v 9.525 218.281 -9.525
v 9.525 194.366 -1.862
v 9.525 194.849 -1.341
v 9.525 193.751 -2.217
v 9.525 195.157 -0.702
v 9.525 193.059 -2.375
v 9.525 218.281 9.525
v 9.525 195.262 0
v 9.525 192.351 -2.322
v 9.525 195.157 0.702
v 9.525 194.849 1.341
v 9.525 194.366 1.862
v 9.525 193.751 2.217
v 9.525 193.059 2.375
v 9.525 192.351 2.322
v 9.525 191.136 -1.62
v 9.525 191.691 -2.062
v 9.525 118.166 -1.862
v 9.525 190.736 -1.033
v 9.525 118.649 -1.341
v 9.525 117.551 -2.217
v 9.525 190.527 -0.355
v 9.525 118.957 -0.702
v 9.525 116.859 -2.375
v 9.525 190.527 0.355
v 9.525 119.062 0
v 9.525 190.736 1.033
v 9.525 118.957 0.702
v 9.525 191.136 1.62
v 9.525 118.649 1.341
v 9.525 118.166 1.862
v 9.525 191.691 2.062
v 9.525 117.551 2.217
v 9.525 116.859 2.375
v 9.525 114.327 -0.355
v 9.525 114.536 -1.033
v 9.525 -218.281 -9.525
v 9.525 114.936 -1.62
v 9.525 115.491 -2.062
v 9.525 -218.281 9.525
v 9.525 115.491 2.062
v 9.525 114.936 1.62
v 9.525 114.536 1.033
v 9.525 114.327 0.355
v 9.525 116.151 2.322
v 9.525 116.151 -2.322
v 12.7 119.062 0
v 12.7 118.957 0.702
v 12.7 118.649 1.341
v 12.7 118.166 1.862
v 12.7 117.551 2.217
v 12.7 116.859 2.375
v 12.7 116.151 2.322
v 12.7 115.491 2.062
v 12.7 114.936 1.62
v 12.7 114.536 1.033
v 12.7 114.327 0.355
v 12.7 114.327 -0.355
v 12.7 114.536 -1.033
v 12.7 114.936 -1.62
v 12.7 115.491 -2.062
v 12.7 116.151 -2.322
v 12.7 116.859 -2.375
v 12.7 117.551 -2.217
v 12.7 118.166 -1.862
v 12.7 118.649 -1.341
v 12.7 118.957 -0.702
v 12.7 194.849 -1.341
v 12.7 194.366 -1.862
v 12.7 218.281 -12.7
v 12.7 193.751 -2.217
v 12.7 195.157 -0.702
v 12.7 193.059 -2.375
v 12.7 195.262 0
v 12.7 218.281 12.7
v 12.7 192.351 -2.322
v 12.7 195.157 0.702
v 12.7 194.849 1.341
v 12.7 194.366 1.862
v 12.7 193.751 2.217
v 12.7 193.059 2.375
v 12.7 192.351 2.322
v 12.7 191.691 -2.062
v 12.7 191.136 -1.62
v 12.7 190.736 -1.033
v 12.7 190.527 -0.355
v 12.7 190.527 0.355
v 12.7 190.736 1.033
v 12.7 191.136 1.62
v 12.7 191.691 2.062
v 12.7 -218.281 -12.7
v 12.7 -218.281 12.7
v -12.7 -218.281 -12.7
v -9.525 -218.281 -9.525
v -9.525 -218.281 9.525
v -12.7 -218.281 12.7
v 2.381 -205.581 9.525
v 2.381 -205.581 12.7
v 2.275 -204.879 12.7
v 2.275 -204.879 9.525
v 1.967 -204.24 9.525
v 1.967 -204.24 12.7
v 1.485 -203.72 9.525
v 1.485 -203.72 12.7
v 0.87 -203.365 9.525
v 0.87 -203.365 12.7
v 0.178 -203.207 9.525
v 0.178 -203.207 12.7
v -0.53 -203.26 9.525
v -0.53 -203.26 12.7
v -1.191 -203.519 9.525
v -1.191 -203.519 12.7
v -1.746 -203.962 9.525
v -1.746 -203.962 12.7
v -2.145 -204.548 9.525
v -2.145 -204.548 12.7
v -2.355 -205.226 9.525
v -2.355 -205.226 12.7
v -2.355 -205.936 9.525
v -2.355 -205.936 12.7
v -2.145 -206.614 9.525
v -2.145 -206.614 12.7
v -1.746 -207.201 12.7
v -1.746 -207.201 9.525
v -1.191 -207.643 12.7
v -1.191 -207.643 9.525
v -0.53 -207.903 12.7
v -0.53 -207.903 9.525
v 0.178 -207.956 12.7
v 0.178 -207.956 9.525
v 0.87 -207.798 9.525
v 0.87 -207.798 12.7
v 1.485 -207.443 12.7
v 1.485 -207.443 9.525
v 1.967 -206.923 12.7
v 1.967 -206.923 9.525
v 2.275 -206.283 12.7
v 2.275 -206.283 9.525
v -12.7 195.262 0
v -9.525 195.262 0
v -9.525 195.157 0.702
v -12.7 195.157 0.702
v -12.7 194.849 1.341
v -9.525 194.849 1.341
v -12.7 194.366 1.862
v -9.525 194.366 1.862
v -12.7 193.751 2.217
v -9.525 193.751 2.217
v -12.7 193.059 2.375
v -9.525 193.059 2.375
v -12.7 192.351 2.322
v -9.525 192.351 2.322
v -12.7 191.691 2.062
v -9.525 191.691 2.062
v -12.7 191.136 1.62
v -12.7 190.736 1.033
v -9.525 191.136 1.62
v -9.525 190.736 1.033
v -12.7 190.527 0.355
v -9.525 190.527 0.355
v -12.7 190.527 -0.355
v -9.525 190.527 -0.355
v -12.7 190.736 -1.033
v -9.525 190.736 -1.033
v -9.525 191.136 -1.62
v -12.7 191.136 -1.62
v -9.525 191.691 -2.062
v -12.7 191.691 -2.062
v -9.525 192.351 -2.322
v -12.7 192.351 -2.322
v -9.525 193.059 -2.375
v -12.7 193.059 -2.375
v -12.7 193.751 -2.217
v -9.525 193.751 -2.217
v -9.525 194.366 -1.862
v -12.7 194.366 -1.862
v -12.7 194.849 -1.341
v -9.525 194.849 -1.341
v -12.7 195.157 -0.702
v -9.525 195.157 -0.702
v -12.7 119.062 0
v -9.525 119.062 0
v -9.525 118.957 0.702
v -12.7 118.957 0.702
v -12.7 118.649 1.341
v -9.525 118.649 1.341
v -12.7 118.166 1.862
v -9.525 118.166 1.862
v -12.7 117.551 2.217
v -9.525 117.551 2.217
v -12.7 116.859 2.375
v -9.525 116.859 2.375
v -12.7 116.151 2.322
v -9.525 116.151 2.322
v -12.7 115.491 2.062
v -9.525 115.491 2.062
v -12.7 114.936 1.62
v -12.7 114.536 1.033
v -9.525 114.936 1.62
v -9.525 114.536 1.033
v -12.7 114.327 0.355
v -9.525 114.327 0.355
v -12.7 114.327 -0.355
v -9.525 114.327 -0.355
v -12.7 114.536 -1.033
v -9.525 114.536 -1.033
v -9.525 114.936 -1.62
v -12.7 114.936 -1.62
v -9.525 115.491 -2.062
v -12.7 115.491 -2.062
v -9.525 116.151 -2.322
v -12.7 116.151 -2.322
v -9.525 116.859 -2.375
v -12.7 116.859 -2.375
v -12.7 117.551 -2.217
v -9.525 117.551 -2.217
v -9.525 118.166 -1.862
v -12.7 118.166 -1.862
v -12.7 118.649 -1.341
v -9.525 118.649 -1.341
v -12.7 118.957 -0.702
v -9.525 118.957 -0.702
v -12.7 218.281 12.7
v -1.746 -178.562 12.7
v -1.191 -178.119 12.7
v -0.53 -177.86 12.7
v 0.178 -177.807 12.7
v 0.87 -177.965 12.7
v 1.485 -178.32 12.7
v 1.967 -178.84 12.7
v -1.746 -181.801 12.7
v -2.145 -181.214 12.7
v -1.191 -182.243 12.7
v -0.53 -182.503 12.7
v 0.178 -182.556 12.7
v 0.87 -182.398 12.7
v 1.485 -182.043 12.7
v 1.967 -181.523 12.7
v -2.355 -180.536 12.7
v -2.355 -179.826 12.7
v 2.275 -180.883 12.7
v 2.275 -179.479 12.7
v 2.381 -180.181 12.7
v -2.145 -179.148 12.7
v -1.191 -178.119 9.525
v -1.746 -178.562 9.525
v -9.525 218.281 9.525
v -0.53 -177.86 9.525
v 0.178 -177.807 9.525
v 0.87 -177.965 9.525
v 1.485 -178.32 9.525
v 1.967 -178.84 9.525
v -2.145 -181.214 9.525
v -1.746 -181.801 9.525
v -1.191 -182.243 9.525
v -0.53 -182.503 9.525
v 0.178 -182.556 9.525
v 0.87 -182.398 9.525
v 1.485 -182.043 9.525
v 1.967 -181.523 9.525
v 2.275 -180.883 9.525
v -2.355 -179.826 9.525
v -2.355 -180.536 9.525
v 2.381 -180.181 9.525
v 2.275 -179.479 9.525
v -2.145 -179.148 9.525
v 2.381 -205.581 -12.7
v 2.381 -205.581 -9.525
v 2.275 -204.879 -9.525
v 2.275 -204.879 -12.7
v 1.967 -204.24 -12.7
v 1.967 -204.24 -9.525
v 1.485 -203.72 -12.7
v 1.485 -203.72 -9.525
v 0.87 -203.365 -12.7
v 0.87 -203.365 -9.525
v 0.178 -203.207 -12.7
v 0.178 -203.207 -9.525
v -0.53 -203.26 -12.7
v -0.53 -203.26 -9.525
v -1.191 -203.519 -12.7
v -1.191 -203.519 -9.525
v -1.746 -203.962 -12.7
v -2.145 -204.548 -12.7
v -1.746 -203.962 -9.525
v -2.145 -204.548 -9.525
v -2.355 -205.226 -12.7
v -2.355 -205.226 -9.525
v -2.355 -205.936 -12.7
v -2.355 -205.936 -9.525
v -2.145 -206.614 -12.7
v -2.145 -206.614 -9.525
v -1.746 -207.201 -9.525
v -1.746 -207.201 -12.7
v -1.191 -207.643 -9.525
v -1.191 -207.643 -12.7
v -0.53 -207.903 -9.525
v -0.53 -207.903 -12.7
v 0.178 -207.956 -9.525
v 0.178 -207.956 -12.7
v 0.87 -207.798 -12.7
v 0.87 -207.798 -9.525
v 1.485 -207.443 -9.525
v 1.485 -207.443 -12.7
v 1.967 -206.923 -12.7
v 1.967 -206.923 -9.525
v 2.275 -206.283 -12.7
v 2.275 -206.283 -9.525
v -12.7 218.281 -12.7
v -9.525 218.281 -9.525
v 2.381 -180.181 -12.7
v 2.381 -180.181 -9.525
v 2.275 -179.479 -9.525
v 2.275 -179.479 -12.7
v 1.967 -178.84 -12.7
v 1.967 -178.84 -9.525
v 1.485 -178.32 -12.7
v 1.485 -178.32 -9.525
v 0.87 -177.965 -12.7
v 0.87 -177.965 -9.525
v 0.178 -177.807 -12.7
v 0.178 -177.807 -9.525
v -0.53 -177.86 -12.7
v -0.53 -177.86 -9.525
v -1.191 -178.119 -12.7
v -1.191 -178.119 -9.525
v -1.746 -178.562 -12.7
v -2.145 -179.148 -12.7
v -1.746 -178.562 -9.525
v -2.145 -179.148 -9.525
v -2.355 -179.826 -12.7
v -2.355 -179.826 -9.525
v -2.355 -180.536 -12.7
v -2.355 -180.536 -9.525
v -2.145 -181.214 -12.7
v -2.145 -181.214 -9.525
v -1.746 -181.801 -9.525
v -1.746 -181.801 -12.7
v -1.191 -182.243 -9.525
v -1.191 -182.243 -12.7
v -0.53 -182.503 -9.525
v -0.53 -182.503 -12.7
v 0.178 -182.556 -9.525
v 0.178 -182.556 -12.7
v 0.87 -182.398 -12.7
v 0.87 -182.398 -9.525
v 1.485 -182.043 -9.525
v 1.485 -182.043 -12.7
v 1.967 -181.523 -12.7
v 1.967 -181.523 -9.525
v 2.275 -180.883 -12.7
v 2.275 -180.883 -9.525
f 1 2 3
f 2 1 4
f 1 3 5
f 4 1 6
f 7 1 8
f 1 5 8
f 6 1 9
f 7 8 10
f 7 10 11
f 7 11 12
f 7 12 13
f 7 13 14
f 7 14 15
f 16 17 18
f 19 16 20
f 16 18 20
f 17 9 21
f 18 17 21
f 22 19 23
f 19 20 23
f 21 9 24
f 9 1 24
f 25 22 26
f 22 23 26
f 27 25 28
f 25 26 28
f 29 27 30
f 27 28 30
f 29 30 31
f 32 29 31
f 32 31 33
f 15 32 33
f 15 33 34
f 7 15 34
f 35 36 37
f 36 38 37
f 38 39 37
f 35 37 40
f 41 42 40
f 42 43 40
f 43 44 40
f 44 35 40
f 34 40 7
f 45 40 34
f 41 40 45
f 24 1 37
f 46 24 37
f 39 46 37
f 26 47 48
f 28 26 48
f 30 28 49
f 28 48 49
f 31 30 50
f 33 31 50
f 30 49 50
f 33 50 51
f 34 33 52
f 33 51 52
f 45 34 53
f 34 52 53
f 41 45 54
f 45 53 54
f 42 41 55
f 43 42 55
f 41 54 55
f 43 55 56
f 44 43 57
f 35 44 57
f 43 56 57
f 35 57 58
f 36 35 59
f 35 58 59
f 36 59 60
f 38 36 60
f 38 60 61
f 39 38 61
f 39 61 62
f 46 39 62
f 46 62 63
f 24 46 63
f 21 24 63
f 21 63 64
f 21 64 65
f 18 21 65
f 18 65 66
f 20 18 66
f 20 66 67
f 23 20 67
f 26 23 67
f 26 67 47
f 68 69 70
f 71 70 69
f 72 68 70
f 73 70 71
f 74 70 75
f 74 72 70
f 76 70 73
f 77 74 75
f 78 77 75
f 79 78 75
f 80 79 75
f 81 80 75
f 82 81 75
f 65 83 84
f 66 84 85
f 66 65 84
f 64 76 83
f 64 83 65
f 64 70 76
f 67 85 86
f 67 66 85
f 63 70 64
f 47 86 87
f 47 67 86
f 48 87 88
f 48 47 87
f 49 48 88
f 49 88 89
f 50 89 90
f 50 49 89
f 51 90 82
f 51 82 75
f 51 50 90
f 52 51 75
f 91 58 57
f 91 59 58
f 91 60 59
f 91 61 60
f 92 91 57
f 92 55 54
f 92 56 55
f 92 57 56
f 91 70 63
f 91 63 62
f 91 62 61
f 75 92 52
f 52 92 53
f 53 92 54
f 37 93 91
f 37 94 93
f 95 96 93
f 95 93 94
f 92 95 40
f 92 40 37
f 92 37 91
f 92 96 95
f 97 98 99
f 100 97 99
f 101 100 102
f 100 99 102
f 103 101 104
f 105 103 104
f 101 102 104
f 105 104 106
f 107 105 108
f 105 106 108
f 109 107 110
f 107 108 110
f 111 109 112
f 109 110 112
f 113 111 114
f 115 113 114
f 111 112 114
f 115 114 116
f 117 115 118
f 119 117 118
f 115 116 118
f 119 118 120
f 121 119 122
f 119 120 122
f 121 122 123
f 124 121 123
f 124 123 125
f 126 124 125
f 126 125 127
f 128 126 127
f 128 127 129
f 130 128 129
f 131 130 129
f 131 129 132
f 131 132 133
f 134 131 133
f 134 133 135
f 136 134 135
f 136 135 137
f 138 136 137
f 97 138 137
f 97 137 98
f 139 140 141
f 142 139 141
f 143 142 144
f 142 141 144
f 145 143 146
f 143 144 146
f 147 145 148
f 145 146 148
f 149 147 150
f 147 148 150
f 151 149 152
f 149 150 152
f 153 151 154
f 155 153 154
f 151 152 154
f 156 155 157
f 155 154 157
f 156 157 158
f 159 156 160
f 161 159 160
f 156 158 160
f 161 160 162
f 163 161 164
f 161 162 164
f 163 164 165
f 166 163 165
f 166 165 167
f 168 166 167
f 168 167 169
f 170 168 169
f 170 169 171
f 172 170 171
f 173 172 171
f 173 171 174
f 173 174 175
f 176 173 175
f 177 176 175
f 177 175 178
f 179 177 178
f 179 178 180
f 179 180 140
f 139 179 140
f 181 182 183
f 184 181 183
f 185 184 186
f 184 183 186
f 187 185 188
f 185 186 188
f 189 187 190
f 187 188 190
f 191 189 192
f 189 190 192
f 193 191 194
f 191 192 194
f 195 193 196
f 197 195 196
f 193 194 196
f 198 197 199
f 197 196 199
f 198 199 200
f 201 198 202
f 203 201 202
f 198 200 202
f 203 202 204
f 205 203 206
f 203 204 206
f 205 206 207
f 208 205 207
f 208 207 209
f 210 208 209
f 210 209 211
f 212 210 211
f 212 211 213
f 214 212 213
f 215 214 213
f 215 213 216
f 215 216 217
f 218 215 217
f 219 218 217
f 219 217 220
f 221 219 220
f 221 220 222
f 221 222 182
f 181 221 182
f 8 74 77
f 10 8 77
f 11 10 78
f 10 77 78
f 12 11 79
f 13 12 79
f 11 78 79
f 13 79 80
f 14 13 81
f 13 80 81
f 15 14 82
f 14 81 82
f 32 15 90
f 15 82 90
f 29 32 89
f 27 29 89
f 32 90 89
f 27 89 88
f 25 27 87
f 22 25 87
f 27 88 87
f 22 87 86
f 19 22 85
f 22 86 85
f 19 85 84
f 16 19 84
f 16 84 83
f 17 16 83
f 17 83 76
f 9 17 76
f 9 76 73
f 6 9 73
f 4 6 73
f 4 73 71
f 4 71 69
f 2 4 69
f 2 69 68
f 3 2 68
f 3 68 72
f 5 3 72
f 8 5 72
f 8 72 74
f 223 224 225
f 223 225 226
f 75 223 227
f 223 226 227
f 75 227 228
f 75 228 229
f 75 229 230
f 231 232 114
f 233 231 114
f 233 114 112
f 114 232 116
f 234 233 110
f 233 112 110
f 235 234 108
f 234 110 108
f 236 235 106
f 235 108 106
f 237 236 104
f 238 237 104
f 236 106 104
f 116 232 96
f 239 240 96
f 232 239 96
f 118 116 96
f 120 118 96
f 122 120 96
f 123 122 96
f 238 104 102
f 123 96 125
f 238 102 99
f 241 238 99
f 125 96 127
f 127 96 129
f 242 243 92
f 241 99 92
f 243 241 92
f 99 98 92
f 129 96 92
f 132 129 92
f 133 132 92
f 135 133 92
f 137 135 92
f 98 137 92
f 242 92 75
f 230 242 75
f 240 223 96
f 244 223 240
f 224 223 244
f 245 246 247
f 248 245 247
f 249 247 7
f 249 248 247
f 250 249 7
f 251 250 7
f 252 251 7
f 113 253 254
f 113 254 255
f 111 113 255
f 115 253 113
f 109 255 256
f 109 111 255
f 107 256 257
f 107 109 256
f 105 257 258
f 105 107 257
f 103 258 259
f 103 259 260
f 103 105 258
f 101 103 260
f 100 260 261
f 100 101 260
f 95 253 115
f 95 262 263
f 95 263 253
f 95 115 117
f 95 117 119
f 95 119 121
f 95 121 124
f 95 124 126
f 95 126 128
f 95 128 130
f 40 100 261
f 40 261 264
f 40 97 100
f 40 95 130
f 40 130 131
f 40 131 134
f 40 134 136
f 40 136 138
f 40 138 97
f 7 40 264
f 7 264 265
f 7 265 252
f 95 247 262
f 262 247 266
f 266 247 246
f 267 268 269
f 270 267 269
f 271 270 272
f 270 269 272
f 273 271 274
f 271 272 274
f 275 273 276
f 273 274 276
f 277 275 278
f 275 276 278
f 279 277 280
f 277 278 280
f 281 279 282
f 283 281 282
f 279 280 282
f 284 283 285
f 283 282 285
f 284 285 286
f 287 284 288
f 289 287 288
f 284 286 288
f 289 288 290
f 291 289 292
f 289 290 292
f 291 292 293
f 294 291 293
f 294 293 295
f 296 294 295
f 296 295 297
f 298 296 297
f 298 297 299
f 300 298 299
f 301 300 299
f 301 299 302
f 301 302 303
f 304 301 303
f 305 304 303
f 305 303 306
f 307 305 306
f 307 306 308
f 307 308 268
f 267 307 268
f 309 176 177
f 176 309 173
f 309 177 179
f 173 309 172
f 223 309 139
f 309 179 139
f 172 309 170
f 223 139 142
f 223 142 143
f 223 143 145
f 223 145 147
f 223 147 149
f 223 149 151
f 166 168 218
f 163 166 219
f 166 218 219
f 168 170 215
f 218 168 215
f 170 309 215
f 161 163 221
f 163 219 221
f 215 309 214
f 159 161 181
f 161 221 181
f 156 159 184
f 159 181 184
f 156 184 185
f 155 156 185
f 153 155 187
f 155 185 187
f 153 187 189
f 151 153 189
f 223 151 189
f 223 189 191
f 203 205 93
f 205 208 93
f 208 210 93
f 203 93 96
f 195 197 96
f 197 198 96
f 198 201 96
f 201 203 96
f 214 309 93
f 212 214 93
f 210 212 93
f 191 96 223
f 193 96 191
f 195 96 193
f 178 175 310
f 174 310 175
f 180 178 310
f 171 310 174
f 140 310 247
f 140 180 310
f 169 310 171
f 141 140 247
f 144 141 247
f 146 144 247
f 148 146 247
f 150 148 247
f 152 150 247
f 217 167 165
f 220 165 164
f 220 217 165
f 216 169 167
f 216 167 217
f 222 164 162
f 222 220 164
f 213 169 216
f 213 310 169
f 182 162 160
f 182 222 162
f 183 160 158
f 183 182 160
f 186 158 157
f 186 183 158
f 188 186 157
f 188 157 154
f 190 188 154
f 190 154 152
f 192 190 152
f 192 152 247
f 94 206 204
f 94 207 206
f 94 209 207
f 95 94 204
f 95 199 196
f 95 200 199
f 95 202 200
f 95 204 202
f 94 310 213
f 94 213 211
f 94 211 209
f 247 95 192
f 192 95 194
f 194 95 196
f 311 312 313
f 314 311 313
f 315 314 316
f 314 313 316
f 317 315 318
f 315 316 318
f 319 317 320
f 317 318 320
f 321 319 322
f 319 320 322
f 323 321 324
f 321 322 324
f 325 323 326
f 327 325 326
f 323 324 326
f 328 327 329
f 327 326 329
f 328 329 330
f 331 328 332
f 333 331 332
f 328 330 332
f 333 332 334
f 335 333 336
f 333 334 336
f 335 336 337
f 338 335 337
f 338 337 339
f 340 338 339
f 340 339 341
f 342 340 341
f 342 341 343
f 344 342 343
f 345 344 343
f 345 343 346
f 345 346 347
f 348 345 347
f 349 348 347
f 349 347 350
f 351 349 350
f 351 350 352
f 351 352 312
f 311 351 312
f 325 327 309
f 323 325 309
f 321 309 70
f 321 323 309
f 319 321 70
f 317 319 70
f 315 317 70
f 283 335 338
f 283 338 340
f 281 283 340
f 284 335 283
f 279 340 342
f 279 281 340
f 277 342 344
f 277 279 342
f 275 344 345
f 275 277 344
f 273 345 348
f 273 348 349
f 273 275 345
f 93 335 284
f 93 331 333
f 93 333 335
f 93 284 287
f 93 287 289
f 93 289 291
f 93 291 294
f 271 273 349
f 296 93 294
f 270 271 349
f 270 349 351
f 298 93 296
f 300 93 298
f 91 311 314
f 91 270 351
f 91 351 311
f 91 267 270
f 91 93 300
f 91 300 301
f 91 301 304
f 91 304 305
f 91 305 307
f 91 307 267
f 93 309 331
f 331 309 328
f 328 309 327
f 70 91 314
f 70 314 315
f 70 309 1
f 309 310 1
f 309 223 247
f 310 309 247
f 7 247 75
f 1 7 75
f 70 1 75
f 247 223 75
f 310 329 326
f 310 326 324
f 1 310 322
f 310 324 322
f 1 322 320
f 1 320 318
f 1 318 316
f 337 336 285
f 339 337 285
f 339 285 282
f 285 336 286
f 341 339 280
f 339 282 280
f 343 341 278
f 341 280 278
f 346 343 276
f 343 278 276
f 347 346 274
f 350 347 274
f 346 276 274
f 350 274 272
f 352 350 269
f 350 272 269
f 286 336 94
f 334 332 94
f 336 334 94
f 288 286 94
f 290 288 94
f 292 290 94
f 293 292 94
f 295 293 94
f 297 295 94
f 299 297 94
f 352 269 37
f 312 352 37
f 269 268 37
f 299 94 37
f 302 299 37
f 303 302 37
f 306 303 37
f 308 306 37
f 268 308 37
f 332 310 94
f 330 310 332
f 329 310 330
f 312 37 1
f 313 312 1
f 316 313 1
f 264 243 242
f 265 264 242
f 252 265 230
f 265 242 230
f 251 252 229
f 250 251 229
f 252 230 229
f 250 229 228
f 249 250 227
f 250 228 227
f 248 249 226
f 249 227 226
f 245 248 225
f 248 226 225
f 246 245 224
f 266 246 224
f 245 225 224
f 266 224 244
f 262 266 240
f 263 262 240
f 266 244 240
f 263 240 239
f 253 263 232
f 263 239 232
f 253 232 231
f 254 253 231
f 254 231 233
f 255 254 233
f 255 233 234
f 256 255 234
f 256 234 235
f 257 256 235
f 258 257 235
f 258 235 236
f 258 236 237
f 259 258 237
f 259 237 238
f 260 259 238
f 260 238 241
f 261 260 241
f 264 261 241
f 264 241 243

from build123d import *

# Parameters (mm, degrees)
F0_W     = 25.4
F0_H     = 25.4
F0_W_2   = 19.05
F0_H_2   = 19.05
F1_DEPTH = 218.28125
F2_R     = 2.38125
F3_DEPTH = 25.401
F4_R     = 2.38125
F5_DEPTH = 25.401


with BuildPart() as f1:
    # F0 (on Front) → F1 (new body, symmetric)
    with BuildSketch(Plane.XZ):
        Rectangle(F0_W, F0_H)
        Rectangle(F0_W_2, F0_H_2, mode=Mode.SUBTRACT)
    extrude(amount=F1_DEPTH, both=True)

    # F2 (on face) → F3 (cut, through all)
    with BuildSketch(Plane.XY.offset(12.7)):
        with Locations((0, -205.58125)):
            Circle(F2_R)
        with Locations((0, -180.18125)):
            Circle(F2_R)
    extrude(amount=-F3_DEPTH, mode=Mode.SUBTRACT)

    # F4 (on face) → F5 (cut, through all)
    with BuildSketch(Plane.YZ.offset(12.7)):
        with Locations((192.88125, 0)):
            Circle(F4_R)
        with Locations((116.68125, 0)):
            Circle(F4_R)
    extrude(amount=-F5_DEPTH, mode=Mode.SUBTRACT)


solid = f1.part
